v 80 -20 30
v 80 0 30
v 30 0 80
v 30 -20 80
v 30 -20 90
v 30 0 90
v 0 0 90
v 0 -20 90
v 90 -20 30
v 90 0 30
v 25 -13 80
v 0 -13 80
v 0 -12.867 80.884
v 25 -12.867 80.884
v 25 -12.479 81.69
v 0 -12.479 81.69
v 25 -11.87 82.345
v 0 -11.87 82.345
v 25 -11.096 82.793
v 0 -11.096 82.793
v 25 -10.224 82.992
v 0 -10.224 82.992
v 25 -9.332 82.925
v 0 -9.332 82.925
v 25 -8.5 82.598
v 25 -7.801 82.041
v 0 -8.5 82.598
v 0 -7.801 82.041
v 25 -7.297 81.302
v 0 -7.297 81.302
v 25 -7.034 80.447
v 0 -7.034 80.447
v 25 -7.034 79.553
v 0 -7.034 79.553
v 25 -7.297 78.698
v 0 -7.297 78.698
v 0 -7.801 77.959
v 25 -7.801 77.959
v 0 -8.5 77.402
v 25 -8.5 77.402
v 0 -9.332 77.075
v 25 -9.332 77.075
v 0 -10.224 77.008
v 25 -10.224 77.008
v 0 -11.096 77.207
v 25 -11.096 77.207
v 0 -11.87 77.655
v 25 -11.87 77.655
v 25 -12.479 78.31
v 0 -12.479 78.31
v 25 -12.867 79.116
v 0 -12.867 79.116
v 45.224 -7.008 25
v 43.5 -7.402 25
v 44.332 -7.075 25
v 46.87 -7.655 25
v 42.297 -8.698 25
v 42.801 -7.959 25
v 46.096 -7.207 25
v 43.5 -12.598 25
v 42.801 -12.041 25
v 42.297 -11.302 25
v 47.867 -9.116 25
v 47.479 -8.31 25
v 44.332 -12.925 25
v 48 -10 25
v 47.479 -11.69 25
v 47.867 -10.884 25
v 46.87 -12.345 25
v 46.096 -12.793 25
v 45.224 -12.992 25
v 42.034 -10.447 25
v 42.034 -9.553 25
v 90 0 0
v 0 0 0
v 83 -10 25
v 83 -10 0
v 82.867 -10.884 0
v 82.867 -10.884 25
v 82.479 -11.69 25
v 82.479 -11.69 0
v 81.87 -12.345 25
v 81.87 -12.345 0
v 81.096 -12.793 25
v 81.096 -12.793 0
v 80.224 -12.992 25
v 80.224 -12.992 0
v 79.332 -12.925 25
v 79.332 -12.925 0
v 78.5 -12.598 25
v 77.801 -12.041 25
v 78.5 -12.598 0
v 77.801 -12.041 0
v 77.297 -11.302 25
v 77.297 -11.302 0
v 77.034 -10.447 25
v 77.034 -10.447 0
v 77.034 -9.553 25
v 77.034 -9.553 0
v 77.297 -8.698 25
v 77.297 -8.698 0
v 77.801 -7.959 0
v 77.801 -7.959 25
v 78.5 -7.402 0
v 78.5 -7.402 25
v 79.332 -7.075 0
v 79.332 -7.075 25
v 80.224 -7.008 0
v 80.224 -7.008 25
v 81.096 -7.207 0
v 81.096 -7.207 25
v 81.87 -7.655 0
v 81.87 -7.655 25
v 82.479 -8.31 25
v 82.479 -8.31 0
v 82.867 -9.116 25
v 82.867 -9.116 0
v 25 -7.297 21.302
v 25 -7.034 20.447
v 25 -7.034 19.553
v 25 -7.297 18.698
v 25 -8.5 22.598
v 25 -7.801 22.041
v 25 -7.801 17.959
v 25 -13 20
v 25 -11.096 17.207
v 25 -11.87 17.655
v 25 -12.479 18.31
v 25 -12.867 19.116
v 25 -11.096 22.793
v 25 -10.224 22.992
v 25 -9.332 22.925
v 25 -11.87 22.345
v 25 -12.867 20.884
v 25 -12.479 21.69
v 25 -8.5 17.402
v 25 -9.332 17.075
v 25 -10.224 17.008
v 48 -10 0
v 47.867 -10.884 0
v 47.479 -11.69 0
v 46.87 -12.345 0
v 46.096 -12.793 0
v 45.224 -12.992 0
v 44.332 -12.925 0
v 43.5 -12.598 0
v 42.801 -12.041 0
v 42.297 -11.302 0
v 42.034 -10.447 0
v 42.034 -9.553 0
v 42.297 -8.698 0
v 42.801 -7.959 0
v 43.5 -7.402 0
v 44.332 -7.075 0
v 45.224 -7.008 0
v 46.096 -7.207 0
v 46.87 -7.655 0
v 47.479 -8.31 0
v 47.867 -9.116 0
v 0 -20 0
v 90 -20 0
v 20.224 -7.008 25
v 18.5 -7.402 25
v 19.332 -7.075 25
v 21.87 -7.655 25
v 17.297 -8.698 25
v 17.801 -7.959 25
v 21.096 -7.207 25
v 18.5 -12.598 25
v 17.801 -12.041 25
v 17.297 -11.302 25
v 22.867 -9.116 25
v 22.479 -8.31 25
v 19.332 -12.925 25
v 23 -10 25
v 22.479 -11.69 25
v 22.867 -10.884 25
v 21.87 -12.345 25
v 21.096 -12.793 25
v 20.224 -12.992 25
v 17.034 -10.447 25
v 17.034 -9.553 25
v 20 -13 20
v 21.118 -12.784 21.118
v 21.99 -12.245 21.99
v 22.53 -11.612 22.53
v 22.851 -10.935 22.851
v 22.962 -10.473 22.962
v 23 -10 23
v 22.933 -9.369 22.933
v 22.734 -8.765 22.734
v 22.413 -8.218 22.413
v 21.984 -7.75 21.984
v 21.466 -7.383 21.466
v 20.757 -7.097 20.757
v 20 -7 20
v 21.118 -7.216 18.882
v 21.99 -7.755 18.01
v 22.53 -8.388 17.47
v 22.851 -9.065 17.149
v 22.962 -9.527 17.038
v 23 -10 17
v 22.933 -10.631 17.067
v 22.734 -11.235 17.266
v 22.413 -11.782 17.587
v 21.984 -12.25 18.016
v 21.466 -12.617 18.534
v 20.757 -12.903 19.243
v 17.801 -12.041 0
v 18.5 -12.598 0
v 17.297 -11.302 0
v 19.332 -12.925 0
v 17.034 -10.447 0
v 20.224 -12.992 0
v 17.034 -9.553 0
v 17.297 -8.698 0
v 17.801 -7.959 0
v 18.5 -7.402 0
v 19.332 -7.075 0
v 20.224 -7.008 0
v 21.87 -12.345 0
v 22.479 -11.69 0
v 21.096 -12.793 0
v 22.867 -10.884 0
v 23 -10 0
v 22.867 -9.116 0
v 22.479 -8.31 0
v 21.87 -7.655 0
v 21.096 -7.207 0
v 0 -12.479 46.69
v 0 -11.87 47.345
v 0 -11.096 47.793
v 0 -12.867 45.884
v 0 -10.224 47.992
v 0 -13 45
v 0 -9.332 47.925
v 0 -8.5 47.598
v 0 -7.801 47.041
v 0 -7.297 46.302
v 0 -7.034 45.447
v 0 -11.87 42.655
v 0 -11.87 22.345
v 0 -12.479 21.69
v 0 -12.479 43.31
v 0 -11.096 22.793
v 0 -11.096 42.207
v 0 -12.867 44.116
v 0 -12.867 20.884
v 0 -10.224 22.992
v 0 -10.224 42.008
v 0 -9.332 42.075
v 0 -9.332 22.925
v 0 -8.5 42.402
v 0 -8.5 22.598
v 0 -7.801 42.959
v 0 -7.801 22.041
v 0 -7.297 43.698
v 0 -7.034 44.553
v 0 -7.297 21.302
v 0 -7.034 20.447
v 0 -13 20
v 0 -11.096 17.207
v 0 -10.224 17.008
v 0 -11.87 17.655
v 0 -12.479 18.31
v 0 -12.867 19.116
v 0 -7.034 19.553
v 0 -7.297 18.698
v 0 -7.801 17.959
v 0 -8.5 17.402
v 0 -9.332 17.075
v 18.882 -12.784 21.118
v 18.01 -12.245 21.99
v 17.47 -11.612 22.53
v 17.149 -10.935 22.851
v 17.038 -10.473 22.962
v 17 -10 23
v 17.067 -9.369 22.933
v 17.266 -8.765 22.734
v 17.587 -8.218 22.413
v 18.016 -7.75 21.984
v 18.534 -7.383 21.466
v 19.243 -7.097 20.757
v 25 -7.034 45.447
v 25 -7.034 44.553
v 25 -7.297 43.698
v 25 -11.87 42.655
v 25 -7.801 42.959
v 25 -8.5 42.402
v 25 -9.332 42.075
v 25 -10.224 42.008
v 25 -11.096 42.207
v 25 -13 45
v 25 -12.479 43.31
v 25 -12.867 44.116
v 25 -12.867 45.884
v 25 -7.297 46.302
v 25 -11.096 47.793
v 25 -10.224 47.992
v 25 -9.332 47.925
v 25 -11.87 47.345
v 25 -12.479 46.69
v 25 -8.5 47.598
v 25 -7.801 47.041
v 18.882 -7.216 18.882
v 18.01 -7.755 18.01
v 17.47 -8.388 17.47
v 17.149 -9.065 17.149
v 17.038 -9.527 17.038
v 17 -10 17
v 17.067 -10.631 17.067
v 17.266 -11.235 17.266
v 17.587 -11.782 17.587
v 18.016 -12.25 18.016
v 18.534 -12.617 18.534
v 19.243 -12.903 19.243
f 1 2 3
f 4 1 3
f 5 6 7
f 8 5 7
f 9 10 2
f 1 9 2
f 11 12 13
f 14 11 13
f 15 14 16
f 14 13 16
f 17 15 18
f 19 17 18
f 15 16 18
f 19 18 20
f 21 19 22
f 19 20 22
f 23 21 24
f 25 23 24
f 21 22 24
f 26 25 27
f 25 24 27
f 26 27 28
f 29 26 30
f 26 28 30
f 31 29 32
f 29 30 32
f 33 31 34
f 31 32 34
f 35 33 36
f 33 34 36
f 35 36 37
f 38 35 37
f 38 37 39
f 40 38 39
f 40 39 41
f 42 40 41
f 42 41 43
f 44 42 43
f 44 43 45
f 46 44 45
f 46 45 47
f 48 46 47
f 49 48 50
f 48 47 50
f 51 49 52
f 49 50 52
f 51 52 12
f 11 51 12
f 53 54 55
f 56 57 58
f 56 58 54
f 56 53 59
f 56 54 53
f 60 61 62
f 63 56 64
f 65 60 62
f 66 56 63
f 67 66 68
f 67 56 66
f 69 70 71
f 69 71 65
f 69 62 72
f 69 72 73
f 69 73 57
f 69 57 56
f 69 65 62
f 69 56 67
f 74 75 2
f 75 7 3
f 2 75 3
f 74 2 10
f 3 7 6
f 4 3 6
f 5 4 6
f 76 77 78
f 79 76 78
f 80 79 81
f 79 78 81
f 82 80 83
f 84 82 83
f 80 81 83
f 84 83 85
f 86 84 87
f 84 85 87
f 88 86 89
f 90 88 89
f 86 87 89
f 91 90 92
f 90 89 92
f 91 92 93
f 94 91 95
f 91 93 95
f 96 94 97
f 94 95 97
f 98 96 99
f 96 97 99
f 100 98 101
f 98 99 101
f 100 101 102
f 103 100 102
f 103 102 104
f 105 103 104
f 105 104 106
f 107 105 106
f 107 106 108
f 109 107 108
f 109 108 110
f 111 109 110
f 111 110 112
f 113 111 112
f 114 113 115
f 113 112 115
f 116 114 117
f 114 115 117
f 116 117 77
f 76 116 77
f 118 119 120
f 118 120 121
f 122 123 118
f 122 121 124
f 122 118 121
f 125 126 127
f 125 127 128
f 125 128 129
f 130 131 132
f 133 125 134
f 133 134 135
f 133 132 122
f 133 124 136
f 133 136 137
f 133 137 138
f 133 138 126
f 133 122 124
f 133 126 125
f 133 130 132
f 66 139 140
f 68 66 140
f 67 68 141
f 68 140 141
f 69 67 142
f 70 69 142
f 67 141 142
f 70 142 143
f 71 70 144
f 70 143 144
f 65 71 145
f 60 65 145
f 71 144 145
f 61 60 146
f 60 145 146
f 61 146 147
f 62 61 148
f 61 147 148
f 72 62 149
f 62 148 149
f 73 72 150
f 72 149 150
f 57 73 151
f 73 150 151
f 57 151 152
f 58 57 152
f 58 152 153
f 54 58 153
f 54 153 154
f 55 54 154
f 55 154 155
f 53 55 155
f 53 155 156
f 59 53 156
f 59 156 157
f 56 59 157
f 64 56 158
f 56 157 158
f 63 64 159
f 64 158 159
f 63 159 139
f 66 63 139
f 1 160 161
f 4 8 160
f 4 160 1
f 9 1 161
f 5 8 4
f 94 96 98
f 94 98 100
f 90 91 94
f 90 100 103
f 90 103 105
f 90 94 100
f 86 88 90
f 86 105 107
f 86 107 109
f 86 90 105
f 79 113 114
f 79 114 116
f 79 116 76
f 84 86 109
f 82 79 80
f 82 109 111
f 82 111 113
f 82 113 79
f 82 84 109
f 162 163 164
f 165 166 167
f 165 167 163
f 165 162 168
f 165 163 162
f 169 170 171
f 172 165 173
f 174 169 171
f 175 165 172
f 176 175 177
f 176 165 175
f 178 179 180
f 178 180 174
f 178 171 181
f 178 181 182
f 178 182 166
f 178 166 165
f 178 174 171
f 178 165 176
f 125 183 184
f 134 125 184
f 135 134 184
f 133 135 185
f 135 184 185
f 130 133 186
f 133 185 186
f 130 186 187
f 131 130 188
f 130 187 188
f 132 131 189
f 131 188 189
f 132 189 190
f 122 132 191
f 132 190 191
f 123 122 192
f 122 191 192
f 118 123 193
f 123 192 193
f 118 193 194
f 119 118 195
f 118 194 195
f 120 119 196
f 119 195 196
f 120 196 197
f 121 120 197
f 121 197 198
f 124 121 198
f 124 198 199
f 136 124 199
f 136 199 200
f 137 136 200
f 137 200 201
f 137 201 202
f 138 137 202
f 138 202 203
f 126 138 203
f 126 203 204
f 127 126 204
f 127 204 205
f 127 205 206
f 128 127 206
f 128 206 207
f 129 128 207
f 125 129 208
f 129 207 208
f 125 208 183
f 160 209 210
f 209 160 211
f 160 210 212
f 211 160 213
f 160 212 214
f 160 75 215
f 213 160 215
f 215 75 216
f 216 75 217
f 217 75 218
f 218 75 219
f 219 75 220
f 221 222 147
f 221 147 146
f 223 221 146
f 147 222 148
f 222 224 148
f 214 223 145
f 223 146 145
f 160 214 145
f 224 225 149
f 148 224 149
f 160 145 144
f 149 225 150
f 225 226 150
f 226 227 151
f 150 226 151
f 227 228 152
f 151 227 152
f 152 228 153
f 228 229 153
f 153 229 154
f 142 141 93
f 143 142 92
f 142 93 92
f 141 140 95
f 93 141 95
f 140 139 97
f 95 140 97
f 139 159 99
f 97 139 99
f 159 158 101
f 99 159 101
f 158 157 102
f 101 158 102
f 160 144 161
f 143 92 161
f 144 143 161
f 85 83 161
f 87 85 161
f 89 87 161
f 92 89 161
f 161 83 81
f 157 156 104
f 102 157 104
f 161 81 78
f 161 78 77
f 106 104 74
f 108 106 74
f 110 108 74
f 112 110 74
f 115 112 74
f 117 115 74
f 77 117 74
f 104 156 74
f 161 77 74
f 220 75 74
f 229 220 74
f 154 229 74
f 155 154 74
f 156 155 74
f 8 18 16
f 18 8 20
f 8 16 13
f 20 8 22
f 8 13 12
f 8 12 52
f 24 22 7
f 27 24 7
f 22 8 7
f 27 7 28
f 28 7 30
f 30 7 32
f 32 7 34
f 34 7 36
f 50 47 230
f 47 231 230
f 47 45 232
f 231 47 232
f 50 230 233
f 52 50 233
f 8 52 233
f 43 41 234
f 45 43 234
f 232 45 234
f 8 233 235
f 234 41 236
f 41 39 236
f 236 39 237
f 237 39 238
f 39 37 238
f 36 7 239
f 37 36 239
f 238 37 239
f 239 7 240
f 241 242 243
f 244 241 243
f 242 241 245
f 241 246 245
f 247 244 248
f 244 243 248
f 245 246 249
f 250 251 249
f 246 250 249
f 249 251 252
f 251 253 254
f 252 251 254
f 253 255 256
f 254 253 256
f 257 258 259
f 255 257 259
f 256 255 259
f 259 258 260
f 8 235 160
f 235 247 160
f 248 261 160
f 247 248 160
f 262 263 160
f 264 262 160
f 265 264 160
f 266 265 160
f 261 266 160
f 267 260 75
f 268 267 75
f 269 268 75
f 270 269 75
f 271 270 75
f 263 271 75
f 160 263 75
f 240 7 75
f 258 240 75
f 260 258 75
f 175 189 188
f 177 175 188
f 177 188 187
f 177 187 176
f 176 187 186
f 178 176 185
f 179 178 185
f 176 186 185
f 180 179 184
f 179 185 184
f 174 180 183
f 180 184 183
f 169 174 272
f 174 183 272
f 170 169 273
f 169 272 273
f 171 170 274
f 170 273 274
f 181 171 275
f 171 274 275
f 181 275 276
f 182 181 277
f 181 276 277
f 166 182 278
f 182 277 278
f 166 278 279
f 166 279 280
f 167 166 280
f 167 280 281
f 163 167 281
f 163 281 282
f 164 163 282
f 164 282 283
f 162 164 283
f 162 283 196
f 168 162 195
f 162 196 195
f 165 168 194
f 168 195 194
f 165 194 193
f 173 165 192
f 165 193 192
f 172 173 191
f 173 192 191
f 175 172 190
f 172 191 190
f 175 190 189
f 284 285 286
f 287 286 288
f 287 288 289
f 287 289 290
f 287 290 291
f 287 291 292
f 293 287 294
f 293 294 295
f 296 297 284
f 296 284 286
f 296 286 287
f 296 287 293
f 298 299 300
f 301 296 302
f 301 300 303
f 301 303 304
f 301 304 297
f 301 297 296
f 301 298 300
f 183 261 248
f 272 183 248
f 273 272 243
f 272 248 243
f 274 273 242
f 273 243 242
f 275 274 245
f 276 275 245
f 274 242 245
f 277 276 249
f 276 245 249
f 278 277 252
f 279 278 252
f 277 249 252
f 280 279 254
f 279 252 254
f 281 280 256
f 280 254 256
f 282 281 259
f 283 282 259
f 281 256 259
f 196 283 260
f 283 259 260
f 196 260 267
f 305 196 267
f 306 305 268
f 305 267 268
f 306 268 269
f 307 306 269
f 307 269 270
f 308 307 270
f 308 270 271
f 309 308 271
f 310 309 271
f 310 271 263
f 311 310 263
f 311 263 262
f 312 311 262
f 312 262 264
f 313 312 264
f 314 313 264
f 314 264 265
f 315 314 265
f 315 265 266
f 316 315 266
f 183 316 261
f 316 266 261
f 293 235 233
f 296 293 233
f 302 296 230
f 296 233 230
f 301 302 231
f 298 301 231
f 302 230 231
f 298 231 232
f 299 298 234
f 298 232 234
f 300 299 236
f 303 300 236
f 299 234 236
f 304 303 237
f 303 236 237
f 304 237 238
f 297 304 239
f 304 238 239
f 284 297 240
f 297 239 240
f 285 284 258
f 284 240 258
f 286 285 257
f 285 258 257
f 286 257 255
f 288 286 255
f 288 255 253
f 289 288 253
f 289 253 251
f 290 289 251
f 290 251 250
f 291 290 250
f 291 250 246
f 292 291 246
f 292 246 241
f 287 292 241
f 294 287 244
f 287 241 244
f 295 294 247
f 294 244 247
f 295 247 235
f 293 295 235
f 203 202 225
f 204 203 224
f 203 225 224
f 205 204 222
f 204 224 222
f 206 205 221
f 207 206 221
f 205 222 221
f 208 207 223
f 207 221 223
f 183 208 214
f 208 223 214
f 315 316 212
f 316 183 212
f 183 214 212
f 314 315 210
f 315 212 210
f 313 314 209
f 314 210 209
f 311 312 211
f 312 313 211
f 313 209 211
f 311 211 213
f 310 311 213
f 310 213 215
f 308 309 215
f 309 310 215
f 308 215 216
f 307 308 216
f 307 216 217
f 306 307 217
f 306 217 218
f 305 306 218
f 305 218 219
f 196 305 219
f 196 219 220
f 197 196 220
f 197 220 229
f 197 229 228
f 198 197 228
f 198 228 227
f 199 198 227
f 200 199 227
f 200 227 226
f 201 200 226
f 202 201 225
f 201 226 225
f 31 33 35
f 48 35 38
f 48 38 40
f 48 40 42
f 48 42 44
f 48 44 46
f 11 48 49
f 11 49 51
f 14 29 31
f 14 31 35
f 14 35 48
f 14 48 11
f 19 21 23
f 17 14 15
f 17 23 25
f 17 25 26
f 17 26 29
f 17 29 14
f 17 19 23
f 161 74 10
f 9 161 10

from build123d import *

# Parameters (mm, degrees)
F1_DEPTH = 20
F2_R     = 3
F3_DEPTH = 25
F4_R     = 3
F5_DEPTH = 25


with BuildPart() as f1:
    # F0 (on Front) → F1 (new body)
    with BuildSketch(Plane.XZ):
        Polygon((0, 90), (0, 0), (90, 0), (90, 30), (80, 30), (30, 80), (30, 90), align=None)
    extrude(amount=F1_DEPTH)

    # F2 (on face) → F3 (cut)
    with BuildSketch(Plane(origin=(0, 0, 0), x_dir=(0, -1, 0), z_dir=(-1, 0, 0))):
        with Locations((10, 20)):
            Circle(F2_R)
        with Locations((10, 45)):
            Circle(F2_R)
        with Locations((10, 80)):
            Circle(F2_R)
    extrude(amount=-F3_DEPTH, mode=Mode.SUBTRACT)

    # F4 (on face) → F5 (cut)
    with BuildSketch(Plane(origin=(0, 0, 0), x_dir=(1, 0, 0), z_dir=(0, 0, -1))):
        with Locations((20, 10)):
            Circle(F4_R)
        with Locations((45, 10)):
            Circle(F4_R)
        with Locations((80, 10)):
            Circle(F4_R)
    extrude(amount=-F5_DEPTH, mode=Mode.SUBTRACT)


solid = f1.part
